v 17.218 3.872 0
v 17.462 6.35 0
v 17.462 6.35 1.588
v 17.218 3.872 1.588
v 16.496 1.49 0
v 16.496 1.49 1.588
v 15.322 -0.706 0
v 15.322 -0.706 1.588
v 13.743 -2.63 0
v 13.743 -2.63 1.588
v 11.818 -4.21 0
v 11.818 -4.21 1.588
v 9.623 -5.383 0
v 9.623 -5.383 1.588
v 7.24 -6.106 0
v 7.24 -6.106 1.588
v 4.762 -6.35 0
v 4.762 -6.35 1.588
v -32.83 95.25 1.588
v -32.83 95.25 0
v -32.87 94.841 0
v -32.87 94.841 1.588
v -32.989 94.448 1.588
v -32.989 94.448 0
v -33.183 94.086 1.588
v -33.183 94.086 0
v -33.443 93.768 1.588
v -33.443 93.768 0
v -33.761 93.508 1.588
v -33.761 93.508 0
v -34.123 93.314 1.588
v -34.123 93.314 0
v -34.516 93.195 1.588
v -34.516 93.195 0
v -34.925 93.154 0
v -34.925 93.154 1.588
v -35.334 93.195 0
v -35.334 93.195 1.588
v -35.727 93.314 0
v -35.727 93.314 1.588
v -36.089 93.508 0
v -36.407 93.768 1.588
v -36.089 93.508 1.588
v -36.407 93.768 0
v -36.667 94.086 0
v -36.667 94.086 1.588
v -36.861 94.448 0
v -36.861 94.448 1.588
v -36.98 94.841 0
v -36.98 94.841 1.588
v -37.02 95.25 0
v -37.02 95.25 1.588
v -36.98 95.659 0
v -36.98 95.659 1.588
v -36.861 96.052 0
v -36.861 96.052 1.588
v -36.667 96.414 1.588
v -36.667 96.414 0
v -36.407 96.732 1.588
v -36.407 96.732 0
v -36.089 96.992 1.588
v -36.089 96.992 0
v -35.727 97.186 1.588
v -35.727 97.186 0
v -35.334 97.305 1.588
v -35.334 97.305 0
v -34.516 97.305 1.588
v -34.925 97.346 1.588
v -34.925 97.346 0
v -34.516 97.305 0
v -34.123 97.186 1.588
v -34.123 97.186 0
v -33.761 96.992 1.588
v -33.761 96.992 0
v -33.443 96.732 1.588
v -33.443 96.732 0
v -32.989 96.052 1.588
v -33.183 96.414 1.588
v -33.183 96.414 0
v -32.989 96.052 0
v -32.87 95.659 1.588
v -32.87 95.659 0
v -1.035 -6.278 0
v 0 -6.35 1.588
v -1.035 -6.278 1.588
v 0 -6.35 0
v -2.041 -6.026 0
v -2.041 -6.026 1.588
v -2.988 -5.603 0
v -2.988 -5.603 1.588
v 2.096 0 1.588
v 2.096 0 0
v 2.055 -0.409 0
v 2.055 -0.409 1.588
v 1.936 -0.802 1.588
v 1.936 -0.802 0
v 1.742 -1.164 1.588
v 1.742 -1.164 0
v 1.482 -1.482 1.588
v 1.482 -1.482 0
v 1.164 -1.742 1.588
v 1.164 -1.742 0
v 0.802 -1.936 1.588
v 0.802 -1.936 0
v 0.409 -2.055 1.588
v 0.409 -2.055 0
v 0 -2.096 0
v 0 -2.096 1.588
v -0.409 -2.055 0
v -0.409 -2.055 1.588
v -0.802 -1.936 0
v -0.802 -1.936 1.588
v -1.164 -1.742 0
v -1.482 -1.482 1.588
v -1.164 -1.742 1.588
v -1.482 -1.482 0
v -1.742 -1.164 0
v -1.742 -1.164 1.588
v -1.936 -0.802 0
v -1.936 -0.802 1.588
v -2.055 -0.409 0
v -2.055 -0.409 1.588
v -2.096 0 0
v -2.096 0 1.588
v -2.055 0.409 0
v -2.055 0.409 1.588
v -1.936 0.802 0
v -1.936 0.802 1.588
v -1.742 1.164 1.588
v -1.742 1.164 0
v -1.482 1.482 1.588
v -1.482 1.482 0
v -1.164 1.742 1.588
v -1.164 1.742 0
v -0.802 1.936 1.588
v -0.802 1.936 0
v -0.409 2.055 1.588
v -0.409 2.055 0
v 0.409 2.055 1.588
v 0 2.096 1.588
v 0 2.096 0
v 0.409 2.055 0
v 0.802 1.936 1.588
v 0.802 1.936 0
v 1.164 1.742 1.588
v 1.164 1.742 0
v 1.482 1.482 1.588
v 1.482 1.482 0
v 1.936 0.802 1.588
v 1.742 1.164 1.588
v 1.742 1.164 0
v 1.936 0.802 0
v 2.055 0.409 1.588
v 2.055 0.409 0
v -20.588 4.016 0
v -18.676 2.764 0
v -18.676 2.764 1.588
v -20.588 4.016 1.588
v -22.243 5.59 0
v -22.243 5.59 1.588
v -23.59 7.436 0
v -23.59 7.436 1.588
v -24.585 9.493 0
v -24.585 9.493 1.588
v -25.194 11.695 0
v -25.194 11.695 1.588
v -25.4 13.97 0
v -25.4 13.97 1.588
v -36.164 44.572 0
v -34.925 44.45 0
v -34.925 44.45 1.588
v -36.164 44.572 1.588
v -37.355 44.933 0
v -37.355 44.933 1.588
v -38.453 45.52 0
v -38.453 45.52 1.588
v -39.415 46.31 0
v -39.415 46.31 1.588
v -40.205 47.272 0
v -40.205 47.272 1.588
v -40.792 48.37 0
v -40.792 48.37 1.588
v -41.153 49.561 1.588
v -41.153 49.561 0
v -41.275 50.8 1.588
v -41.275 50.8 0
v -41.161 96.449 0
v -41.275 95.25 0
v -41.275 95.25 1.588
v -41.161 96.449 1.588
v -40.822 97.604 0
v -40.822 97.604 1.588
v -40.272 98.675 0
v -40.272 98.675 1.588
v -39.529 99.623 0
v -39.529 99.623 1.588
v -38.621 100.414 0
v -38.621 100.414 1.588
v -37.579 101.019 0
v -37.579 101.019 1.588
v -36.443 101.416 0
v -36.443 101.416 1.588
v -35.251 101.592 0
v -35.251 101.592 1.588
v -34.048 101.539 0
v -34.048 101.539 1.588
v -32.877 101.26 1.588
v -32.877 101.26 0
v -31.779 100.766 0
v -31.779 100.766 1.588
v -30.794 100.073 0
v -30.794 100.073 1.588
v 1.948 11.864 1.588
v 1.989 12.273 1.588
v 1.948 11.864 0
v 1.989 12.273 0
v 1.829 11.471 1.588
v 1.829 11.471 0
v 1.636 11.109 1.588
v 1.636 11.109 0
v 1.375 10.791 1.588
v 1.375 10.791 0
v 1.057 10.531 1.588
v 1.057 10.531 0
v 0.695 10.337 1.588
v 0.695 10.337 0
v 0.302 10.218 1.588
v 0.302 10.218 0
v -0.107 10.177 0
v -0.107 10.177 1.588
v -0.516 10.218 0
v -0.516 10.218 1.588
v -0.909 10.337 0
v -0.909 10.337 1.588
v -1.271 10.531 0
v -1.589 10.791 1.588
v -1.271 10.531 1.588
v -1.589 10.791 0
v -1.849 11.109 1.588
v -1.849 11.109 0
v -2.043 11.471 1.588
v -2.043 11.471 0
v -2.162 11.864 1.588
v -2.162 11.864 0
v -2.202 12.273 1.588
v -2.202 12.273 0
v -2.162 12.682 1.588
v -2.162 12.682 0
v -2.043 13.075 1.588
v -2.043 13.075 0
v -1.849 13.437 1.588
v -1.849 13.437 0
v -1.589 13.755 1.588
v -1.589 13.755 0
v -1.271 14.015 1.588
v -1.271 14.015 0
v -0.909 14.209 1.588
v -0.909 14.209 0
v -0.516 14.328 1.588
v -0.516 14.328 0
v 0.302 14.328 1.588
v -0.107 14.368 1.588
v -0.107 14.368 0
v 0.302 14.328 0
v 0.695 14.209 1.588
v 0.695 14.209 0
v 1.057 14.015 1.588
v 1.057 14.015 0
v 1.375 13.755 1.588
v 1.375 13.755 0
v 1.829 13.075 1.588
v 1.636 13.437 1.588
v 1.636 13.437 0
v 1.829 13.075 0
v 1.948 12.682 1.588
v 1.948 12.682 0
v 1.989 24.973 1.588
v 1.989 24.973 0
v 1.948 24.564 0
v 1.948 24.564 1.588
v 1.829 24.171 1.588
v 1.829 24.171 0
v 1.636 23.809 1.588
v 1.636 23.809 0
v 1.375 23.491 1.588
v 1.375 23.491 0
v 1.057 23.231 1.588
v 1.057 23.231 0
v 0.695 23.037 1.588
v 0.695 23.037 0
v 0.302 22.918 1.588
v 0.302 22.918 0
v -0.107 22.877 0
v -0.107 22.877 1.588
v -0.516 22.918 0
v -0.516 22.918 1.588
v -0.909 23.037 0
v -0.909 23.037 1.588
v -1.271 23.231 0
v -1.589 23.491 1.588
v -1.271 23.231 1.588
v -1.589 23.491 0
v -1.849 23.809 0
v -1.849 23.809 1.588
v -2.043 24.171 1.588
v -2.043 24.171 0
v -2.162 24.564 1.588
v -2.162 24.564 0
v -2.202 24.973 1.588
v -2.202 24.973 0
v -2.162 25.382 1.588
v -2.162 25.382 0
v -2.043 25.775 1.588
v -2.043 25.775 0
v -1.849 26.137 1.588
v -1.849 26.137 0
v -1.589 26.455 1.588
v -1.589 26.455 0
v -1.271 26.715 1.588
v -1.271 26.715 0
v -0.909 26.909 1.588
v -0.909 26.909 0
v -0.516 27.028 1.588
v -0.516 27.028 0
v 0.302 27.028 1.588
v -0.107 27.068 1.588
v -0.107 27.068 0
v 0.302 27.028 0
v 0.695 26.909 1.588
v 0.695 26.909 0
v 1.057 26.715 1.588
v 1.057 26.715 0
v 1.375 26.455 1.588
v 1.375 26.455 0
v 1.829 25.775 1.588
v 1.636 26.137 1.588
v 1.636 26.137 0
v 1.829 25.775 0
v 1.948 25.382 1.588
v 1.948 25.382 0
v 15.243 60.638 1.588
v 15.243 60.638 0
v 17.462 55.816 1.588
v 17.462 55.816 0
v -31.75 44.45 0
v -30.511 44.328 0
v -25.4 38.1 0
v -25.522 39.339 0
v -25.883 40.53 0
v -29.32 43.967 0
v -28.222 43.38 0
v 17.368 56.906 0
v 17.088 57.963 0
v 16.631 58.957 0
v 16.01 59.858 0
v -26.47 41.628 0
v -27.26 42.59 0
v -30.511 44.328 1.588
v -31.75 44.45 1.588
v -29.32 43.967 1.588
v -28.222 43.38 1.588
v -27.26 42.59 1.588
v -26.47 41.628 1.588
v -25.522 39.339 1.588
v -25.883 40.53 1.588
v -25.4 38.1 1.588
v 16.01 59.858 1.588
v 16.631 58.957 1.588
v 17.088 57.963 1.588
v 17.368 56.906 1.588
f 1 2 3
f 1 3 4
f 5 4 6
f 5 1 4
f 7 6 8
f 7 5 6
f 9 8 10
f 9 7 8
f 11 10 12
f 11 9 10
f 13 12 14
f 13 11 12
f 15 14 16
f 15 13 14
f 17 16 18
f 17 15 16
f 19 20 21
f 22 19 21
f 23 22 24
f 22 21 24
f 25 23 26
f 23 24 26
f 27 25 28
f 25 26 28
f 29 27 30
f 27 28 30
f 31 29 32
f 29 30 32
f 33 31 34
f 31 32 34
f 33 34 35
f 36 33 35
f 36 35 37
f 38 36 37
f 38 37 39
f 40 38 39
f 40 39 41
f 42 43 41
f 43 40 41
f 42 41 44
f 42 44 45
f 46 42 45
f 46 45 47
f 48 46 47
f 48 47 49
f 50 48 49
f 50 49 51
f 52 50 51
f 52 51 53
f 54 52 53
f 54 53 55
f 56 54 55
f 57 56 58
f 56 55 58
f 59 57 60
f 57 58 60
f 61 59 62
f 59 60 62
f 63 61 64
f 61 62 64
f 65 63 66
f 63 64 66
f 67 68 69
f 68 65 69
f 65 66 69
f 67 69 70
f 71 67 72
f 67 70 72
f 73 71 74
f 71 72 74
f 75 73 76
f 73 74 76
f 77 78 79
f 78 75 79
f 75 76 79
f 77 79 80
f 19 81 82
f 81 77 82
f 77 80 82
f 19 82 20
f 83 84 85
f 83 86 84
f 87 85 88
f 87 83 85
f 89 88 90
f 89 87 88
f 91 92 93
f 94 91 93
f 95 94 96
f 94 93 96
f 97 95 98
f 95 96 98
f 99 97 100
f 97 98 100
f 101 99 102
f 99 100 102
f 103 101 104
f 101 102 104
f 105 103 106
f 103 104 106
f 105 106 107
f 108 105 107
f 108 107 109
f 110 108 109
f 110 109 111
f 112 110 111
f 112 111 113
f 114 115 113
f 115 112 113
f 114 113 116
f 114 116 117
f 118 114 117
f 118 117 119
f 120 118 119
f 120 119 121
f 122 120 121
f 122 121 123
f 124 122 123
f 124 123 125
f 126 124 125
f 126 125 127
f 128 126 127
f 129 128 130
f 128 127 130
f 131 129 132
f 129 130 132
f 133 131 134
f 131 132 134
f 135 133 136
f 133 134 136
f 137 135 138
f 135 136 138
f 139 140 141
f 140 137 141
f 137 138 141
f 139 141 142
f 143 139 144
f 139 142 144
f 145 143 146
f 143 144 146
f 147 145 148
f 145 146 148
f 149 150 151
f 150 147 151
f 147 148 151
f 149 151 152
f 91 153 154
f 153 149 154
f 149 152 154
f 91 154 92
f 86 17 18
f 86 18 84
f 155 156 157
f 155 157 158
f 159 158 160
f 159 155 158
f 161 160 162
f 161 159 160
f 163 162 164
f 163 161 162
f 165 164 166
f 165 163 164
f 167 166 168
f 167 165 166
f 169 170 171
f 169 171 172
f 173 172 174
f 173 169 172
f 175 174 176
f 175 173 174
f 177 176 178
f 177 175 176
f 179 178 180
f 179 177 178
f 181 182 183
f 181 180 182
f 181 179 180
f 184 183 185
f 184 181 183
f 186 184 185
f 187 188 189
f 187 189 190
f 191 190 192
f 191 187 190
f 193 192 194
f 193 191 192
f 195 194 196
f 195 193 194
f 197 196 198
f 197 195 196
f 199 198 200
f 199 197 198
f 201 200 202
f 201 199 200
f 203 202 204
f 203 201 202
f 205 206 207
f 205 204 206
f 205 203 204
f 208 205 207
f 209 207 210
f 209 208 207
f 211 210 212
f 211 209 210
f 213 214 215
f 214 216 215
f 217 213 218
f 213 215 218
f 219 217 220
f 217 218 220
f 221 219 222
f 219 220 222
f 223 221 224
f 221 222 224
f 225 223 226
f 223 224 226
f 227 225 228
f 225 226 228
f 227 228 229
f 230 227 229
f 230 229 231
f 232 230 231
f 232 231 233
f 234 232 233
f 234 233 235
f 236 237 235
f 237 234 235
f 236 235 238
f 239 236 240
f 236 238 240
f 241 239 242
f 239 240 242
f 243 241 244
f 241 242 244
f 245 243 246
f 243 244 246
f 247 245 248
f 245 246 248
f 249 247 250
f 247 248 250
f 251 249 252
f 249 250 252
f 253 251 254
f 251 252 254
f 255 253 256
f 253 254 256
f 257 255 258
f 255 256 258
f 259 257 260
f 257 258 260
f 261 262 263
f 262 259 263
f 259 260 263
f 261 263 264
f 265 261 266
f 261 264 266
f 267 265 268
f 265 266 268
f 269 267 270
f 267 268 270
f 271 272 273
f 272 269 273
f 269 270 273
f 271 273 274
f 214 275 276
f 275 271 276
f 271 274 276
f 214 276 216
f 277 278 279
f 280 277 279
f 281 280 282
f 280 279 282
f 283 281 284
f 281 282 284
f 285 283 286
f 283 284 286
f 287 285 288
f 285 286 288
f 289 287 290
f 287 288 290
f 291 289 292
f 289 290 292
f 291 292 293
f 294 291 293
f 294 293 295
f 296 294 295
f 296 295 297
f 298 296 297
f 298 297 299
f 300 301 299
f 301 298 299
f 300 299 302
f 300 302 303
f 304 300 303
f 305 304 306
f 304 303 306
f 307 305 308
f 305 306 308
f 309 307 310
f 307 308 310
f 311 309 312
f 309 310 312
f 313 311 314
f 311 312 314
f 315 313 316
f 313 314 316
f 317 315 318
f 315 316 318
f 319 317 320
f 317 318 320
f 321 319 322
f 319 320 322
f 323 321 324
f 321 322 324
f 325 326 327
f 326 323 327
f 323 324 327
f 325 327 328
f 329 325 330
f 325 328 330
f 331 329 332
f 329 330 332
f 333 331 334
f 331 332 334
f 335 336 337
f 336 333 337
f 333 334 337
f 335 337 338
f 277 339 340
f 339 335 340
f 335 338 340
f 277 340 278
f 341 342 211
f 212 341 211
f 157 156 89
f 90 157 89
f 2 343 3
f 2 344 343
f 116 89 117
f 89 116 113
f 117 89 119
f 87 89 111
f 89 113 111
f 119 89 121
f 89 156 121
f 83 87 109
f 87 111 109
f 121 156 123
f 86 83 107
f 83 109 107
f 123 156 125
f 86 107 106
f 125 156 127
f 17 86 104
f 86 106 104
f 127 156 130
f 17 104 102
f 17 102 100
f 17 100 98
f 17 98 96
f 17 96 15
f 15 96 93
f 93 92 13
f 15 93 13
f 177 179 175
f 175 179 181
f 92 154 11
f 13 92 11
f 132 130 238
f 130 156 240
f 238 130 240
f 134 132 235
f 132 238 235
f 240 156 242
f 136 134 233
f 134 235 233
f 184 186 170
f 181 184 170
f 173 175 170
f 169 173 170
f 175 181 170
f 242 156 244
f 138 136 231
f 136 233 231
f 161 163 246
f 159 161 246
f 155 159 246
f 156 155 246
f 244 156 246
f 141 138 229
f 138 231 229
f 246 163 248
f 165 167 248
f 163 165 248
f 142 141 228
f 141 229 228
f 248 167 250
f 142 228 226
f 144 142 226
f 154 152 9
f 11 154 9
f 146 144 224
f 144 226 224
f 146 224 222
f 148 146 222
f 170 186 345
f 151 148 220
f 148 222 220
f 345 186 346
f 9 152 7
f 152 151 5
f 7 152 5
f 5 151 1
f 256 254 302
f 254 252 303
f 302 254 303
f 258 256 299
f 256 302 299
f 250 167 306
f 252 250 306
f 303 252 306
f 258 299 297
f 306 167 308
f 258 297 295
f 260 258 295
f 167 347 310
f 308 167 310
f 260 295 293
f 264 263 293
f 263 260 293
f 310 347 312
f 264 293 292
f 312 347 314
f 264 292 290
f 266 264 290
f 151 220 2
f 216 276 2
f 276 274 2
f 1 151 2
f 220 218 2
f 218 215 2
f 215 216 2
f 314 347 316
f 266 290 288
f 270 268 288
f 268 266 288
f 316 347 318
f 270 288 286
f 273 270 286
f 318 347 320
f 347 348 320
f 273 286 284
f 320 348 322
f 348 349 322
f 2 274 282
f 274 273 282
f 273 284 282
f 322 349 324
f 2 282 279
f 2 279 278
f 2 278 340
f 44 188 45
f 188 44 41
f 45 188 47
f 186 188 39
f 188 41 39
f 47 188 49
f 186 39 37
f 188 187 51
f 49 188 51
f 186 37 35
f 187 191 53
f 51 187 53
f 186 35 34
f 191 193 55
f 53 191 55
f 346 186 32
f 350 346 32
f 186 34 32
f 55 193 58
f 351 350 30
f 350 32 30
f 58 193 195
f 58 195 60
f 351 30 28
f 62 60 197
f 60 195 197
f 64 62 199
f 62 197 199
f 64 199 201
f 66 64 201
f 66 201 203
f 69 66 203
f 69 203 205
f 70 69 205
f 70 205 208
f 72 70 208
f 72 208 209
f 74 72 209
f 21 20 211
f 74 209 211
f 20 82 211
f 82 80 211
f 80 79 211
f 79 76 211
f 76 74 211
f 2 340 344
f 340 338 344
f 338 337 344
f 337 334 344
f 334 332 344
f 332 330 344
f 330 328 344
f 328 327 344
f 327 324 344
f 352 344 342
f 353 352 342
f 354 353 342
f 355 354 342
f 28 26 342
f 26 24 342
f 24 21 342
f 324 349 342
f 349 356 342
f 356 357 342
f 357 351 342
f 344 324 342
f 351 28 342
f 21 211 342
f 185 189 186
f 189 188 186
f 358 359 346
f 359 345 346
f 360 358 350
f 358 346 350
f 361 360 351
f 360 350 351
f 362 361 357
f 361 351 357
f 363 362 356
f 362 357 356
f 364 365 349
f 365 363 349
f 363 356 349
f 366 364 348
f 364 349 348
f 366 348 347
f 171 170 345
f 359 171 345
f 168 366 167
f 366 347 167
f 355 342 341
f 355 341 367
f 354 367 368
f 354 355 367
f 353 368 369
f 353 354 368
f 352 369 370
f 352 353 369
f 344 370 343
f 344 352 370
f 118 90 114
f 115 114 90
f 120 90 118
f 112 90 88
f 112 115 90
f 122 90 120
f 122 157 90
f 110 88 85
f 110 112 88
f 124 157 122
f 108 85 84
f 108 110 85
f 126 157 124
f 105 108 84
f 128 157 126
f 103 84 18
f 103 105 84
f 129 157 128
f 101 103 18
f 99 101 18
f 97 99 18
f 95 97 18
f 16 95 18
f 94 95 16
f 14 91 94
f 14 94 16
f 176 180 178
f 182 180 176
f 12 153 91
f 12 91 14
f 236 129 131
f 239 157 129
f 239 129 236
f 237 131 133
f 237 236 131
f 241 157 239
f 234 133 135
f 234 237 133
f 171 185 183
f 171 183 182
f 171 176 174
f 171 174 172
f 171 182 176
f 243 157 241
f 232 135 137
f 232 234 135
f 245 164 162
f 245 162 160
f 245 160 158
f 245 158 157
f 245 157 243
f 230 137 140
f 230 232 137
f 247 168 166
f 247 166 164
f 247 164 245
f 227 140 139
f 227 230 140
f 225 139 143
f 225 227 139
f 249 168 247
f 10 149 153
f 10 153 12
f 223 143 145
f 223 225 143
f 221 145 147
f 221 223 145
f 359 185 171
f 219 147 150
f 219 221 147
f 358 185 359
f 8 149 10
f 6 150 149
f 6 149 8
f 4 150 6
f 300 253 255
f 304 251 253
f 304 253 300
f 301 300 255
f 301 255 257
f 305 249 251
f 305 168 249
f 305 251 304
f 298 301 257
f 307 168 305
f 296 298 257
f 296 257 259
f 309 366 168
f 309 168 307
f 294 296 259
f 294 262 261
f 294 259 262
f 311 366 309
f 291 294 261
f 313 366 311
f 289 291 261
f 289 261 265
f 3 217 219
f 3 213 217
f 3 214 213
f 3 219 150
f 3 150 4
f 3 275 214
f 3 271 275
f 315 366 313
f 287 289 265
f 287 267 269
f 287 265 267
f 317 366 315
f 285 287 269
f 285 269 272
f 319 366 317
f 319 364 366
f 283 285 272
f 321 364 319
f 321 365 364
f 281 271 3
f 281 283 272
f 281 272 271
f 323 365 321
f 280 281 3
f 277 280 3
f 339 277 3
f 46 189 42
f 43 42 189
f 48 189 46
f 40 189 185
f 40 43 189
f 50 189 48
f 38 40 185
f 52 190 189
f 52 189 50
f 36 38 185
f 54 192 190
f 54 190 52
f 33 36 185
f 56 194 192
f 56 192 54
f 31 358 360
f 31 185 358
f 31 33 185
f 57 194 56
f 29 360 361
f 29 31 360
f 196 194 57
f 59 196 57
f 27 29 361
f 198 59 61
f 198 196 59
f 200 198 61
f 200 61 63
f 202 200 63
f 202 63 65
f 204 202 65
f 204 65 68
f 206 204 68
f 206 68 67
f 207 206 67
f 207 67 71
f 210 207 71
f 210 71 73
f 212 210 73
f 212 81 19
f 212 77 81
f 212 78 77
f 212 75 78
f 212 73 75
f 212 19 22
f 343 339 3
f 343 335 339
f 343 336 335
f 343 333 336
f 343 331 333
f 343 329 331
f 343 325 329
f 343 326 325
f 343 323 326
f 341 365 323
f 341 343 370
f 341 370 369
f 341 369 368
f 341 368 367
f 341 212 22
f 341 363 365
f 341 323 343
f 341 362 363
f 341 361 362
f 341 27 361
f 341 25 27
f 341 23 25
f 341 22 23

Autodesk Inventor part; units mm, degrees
ref_plane "YZ Plane" through (0, 0, 0) normal (1, 0, 0) x (0, 1, 0)
ref_plane "XZ Plane" through (0, 0, 0) normal (0, 1, 0) x (-1, 0, 0)
ref_plane "XY Plane" through (0, 0, 0) normal (0, 0, 1) x (1, 0, 0)
sketch "main" plane through (0, 0, 0) normal (0, 0, 1) x (1, 0, 0)
  arc A0 (-13.083, -30.8821) -> (-6.3594, -42.088) centre (-0.383, -30.8821) ccw
  line L0 (-13.083, -6.7521) -> (-13.083, -30.8821)
  arc A1 (-13.083, -6.7521) -> (-19.433, -0.4021) centre (-19.433, -6.7521) ccw
  line L1 (-6.3594, -42.088) -> (9.3288, -50.4551)
  line L2 (29.7795, 10.9635) -> (29.7795, -38.5021)
  arc A2 (29.7795, 10.9635) -> (27.5605, 15.7861) centre (23.4295, 10.9635) ccw
  circle A3 centre (12.317, -44.8521) radius 2.0955
  arc A4 (9.3288, -50.4551) -> (12.317, -51.2021) centre (12.2103, -45.2792) ccw
  line L3 (17.0795, -51.2021) -> (12.317, -51.2021)
  arc A5 (17.0795, -51.2021) -> (29.7795, -38.5021) centre (17.0795, -38.5021) ccw
  circle A6 centre (-22.608, 50.3979) radius 2.0955
  arc A7 (-18.477, 55.2205) -> (-28.958, 50.3979) centre (-22.608, 50.3979) ccw
  line L4 (27.5605, 15.7861) -> (-18.477, 55.2205)
  line L5 (-22.608, -0.4021) -> (-19.433, -0.4021)
  arc A8 (-28.958, 5.9479) -> (-22.608, -0.4021) centre (-22.608, 5.9479) ccw
  line L6 (-28.958, 50.3979) -> (-28.958, 5.9479)
  point P0 (-1.5201, -8.3134)
  dimension "d1" = 4.191
  dimension "d2" = 12.7
  dimension "d3" = 4.191
  dimension "d4" = 12.7
  dimension "d5" = 12.7
  dimension "d6" = 6.35
  dimension "d7" = 6.35
sketch "Sketch1" plane through (0, 0, 0) normal (0, 0, 1) x (1, 0, 0)
  circle A0 centre (-0.1068, 24.9729) radius 2.0955
  circle A1 centre (-0.1068, 12.2729) radius 2.0955
  arc A2 (-25.4, 13.97) -> (-18.6765, 2.7641) centre (-12.7, 13.97) ccw
  line L0 (-25.4, 38.1) -> (-25.4, 13.97)
  arc A3 (-25.4, 38.1) -> (-31.75, 44.45) centre (-31.75, 38.1) ccw
  line L1 (-18.6765, 2.7641) -> (-2.9882, -5.6029)
  line L2 (17.4625, 55.8156) -> (17.4625, 6.35)
  arc A4 (17.4625, 55.8156) -> (15.2434, 60.6383) centre (11.1125, 55.8156) ccw
  circle A5 centre (0, 0) radius 2.0955
  arc A6 (-2.9882, -5.6029) -> (0, -6.35) centre (-0.1068, -0.4271) ccw
  line L3 (4.7625, -6.35) -> (0, -6.35)
  arc A7 (4.7625, -6.35) -> (17.4625, 6.35) centre (4.7625, 6.35) ccw
  circle A8 centre (-34.925, 95.25) radius 2.0955
  arc A9 (-30.7941, 100.0726) -> (-41.275, 95.25) centre (-34.925, 95.25) ccw
  line L4 (15.2434, 60.6383) -> (-30.7941, 100.0726)
  line L5 (-34.925, 44.45) -> (-31.75, 44.45)
  arc A10 (-41.275, 50.8) -> (-34.925, 44.45) centre (-34.925, 50.8) ccw
  line L6 (-41.275, 95.25) -> (-41.275, 50.8)
  dimension "d11" = 4.191
  dimension "d12" = 4.191
extrude "Extrusion1" add sketch "Sketch1" along normal blind 1.5875
properties part number "back_sled" material "Acetal Resin, White"
